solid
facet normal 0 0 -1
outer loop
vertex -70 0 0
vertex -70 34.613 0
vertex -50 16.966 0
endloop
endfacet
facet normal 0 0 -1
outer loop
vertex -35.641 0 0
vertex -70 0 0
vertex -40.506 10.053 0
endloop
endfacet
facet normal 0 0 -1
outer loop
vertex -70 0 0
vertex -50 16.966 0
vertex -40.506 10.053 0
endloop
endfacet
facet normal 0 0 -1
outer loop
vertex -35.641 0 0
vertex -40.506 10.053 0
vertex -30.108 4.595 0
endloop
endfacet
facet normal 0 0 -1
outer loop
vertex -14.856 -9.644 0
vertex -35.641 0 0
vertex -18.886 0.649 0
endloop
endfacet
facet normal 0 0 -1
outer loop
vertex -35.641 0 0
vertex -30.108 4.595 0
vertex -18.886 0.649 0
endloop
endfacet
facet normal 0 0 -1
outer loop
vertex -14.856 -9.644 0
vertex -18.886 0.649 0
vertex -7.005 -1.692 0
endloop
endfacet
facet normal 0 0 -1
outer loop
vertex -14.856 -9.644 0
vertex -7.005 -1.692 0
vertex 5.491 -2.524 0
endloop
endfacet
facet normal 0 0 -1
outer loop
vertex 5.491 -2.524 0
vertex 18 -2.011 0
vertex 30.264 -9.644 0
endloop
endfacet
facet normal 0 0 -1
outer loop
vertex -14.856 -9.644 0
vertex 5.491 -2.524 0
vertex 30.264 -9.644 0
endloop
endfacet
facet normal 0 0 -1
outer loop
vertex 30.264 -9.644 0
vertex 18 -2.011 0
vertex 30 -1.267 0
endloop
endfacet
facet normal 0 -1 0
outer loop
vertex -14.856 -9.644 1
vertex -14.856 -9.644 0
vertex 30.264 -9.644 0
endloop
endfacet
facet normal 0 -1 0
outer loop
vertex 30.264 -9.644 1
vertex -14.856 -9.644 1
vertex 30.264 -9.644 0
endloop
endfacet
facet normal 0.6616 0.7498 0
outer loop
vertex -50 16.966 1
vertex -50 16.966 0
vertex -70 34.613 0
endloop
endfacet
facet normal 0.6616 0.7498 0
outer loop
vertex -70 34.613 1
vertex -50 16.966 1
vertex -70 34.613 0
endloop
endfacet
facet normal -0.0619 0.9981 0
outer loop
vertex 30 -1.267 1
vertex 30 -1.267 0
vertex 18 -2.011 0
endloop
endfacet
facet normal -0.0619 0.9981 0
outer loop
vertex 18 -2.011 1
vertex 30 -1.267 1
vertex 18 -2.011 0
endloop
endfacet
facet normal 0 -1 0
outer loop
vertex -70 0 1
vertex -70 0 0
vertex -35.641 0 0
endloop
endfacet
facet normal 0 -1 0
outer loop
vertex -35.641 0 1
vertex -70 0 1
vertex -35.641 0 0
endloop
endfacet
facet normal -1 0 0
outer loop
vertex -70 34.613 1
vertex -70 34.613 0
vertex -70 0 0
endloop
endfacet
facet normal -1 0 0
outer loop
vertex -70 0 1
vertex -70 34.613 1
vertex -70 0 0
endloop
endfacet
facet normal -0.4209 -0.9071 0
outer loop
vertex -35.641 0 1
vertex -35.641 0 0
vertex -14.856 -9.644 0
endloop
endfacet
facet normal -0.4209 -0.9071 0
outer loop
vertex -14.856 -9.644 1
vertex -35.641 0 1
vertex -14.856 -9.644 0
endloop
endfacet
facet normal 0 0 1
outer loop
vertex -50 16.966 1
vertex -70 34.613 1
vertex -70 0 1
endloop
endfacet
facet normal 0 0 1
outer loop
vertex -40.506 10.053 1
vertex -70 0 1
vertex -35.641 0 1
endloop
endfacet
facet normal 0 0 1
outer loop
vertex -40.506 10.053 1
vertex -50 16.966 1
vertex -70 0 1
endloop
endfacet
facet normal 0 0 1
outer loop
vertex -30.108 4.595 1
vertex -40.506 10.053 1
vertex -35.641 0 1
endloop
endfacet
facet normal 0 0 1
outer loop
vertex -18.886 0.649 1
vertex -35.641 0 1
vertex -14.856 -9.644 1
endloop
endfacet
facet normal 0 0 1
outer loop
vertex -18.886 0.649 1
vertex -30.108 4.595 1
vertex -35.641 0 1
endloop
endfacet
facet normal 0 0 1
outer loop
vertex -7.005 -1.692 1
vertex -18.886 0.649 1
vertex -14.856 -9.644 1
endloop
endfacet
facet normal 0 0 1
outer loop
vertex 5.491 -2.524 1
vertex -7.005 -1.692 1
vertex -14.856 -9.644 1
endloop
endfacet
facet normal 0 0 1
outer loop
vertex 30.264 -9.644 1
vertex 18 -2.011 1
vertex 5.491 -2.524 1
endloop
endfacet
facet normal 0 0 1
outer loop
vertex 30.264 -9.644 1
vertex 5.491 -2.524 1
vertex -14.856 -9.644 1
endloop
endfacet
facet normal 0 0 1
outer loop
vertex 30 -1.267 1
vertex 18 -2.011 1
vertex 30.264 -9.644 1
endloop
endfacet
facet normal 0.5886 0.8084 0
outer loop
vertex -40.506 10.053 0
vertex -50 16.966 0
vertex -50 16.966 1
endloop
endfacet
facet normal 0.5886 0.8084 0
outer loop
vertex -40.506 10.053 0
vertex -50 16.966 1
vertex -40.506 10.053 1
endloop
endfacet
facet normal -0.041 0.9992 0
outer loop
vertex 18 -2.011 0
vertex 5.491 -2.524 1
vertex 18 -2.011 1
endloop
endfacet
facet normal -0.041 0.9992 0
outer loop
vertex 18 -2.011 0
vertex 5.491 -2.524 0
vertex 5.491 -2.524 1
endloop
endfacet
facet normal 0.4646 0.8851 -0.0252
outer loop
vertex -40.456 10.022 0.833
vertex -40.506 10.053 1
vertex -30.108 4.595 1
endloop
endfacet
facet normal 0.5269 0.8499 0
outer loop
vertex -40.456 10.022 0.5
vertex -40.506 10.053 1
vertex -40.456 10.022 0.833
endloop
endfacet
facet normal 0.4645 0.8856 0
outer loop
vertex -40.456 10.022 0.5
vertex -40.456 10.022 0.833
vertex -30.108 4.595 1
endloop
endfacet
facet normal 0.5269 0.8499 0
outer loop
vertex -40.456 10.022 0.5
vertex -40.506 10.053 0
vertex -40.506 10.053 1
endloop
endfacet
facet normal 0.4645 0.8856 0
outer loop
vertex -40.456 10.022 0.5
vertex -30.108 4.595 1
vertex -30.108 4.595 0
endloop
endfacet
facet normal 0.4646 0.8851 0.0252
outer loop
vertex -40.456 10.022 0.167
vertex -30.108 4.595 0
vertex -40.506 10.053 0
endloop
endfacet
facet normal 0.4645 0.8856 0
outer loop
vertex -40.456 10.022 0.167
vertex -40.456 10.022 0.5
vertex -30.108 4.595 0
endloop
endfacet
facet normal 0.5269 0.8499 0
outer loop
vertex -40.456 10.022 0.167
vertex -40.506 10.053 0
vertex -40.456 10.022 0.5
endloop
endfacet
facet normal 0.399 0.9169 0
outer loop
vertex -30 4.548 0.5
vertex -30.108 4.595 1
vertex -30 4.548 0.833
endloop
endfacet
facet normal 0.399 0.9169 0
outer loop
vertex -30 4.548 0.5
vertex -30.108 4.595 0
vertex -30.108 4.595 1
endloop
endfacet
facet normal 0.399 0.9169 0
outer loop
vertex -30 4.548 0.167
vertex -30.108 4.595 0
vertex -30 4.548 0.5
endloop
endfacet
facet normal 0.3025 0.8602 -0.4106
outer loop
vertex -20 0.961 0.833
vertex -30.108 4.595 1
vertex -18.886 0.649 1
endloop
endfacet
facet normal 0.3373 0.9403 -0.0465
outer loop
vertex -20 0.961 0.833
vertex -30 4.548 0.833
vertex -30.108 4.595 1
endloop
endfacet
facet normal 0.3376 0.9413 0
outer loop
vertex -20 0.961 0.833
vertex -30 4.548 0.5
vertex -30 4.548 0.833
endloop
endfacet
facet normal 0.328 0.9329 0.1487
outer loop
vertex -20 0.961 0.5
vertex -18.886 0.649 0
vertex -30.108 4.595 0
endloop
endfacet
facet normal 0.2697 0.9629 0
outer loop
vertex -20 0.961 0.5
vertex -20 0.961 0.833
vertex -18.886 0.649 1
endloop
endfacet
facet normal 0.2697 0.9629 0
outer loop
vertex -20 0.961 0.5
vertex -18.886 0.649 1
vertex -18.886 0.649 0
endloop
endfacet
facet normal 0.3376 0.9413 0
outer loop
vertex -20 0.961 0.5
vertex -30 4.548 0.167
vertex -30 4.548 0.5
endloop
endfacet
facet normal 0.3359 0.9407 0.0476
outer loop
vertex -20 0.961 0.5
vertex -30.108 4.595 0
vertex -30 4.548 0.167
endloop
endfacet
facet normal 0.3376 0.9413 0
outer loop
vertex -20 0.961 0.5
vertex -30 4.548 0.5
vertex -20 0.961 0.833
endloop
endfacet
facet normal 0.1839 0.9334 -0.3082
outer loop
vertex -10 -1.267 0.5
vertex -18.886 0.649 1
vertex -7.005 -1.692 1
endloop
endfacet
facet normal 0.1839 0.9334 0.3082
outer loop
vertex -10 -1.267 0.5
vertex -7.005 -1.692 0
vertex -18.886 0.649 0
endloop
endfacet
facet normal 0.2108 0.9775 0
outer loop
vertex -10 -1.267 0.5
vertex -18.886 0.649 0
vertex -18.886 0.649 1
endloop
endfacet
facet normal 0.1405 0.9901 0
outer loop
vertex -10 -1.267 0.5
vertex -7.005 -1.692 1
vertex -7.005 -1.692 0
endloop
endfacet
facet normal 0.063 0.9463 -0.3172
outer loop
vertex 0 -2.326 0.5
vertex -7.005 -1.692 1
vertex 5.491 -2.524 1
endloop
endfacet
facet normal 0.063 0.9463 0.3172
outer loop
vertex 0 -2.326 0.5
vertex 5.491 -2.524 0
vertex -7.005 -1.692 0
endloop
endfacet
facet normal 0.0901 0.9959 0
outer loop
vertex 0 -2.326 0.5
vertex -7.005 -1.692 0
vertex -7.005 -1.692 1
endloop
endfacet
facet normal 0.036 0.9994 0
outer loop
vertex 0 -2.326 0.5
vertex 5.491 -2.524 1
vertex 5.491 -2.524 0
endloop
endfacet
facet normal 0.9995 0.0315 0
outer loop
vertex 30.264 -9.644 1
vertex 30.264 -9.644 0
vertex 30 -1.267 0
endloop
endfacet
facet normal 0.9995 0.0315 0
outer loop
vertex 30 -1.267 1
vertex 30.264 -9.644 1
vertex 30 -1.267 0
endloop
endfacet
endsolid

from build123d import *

# Parameters (mm, degrees)
P_IDAT_VYSUNUT_M1_DEPTH = 1


with BuildPart() as part:
    # Skica1 → Přidat vysunutím1 (new body)
    with BuildSketch(Plane.XY):
        with BuildLine():
            Line((-50, 16.966408225), (-70, 34.613472684))
            Line((-70, 34.613472684), (-70, 0))
            Line((-70, 0), (-35.640611214, 0))
            Line((-35.640611214, 0), (-14.855667701, -9.644204288))
            Line((-14.855667701, -9.644204288), (30.264283345, -9.644204288))
            Line((30.264283345, -9.644204288), (30, -1.266639703))
            Line((30, -1.266639703), (18, -2.011136657))
            add(Edge.make_bspline(
                [(-50, 16.966408225), (-43.991226664, 11.871570217), (-34.17756419, 5.795583319), (-20.181640748, 0.787148233), (-10.092446875, -1.45782146), (-0.026309786, -2.456617667), (9.343623235, -2.642712691), (15.33383978, -2.176549004), (18, -2.011136657)],
                knots=[0, 0, 0, 0, 0.325390078, 0.471834546, 0.613059233, 0.751676123, 0.88953762, 1, 1, 1, 1], degree=3))
        make_face()
    extrude(amount=P_IDAT_VYSUNUT_M1_DEPTH)


solid = part.part
